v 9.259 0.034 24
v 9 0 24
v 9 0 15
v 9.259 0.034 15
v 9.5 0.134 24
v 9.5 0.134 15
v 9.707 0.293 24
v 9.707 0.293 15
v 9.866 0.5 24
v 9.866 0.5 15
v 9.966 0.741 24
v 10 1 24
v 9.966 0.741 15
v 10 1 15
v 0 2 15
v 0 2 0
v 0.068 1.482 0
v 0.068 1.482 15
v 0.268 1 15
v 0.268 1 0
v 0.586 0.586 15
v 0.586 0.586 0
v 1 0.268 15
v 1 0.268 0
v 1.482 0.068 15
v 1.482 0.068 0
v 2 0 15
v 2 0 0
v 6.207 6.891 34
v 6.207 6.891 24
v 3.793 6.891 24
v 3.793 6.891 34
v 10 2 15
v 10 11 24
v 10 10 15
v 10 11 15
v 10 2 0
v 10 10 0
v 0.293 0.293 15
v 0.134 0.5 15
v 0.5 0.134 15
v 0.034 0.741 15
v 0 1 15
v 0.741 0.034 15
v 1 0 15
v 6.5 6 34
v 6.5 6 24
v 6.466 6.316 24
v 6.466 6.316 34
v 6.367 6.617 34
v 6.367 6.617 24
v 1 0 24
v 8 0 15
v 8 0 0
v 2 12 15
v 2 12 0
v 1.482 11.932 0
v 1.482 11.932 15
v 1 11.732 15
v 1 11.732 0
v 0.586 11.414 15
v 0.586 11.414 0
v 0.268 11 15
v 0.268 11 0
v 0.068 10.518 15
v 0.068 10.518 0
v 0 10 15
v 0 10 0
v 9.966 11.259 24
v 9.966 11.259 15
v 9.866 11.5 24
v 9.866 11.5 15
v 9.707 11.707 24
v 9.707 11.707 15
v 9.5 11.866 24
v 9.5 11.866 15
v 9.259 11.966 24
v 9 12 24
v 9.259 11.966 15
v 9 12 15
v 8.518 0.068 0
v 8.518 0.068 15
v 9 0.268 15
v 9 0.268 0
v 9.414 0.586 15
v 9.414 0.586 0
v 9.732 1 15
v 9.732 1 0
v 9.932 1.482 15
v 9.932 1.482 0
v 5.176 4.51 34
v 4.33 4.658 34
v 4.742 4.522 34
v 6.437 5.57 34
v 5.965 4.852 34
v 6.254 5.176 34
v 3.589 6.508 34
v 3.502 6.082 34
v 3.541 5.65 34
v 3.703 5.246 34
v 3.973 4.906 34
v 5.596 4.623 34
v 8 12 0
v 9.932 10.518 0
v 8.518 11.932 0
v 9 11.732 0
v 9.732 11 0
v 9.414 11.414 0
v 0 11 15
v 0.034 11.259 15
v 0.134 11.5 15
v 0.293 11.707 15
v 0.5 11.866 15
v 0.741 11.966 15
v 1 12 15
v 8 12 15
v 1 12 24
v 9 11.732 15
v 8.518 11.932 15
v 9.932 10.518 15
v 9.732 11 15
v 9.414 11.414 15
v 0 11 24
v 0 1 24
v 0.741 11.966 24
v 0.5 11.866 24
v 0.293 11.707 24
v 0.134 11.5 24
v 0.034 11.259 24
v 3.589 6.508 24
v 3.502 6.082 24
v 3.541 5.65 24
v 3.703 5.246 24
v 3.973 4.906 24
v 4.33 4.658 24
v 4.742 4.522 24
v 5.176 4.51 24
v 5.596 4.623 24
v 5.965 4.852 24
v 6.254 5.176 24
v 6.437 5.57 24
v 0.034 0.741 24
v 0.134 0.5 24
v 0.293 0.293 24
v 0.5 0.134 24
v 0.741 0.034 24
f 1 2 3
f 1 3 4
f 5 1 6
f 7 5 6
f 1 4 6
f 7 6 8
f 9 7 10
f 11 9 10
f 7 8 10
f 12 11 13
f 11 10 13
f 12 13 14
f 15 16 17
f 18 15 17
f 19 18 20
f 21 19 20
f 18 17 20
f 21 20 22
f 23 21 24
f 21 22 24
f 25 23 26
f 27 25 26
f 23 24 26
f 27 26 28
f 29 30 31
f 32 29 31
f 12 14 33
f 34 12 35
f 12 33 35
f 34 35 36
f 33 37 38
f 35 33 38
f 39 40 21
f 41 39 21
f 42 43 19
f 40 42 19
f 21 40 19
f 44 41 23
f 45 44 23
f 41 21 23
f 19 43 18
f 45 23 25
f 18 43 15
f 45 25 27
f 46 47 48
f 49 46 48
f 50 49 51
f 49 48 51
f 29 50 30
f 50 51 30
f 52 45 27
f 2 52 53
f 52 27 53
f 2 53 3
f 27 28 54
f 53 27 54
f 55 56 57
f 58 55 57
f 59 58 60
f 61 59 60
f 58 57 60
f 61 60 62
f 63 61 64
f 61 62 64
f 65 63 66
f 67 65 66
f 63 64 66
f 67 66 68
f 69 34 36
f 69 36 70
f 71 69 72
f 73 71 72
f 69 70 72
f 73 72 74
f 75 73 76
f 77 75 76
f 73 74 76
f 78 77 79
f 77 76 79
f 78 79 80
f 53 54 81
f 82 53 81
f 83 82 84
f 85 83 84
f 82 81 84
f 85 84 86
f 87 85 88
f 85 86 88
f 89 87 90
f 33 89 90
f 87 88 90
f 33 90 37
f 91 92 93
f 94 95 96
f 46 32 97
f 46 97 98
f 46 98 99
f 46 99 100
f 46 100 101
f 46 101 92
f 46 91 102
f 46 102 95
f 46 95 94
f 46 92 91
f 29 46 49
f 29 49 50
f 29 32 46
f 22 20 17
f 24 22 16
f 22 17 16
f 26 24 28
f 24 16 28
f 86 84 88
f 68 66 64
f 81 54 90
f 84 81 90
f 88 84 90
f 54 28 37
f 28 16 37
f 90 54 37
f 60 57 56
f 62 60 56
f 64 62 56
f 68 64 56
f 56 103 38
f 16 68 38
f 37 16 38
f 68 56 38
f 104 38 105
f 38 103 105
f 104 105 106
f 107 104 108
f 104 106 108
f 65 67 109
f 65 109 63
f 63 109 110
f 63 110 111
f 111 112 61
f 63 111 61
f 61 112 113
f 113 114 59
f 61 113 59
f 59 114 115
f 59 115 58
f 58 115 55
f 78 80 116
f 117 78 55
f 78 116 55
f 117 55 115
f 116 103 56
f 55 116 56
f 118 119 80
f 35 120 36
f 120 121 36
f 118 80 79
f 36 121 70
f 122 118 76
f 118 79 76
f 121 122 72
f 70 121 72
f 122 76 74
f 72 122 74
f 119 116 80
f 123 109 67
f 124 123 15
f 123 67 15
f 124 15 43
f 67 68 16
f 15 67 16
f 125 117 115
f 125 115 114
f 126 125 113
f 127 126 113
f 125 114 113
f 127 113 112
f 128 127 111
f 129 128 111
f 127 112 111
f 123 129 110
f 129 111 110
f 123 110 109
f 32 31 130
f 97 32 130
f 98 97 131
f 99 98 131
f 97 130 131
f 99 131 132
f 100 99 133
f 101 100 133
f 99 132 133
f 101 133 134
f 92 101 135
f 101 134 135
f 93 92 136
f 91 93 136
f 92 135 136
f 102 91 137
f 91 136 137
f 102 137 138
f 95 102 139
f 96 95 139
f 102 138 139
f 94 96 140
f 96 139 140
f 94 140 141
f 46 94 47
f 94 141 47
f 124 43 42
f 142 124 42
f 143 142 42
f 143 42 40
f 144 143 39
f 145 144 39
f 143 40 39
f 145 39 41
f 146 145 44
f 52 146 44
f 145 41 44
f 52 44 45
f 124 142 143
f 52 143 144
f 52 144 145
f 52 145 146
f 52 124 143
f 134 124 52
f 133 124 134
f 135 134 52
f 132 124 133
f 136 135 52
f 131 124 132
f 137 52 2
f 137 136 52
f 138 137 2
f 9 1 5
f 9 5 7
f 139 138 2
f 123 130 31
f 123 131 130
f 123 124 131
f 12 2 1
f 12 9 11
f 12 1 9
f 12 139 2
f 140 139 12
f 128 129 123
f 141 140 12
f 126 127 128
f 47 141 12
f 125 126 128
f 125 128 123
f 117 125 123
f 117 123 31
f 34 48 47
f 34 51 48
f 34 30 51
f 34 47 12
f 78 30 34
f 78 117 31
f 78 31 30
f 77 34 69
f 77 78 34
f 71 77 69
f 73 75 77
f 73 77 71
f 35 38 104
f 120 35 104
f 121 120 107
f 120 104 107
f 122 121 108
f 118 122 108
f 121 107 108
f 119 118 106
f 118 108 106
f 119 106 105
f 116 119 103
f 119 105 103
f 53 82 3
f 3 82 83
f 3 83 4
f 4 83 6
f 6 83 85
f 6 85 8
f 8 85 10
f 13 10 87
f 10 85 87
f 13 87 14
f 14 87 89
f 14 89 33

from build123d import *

# Parameters (mm, degrees)
BOSS_EXTRUDE1_DEPTH = 15
BOSS_EXTRUDE2_DEPTH = 9
BOSS_EXTRUDE3_DEPTH = 10


with BuildPart() as part:
    # Sketch1 → Boss-Extrude1 (new body)
    with BuildSketch(Plane.XY):
        with BuildLine():
            Line((2, 0), (8, 0))
            ThreePointArc((8, 0), (9.414213562, 0.585786438), (10, 2))
            Line((10, 2), (10, 10))
            ThreePointArc((10, 10), (9.414213562, 11.414213562), (8, 12))
            Line((8, 12), (2, 12))
            ThreePointArc((2, 12), (0.585786438, 11.414213562), (0, 10))
            Line((0, 10), (0, 2))
            ThreePointArc((0, 2), (0.585786438, 0.585786438), (2, 0))
        make_face()
    extrude(amount=BOSS_EXTRUDE1_DEPTH)

    # Sketch2 → Boss-Extrude2 (add)
    with BuildSketch(Plane.XY.offset(15)):
        with BuildLine():
            Line((1, 0), (9, 0))
            ThreePointArc((9, 0), (9.707106781, 0.292893219), (10, 1))
            Line((10, 1), (10, 11))
            ThreePointArc((10, 11), (9.707106781, 11.707106781), (9, 12))
            Line((9, 12), (1, 12))
            ThreePointArc((1, 12), (0.292893219, 11.707106781), (0, 11))
            Line((0, 11), (0, 1))
            ThreePointArc((0, 1), (0.292893219, 0.292893219), (1, 0))
        make_face()
    extrude(amount=BOSS_EXTRUDE2_DEPTH)

    # Sketch3 → Boss-Extrude3 (add)
    with BuildSketch(Plane.XY.offset(24)):
        with BuildLine():
            Line((6.206664687, 6.891044518), (3.793335313, 6.891044518))
            ThreePointArc((3.793335313, 6.891044518), (4.530956841, 4.575219836), (6.5, 6))
            ThreePointArc((6.5, 6), (6.424780164, 6.469043159), (6.206664687, 6.891044518))
        make_face()
    extrude(amount=BOSS_EXTRUDE3_DEPTH)


solid = part.part
